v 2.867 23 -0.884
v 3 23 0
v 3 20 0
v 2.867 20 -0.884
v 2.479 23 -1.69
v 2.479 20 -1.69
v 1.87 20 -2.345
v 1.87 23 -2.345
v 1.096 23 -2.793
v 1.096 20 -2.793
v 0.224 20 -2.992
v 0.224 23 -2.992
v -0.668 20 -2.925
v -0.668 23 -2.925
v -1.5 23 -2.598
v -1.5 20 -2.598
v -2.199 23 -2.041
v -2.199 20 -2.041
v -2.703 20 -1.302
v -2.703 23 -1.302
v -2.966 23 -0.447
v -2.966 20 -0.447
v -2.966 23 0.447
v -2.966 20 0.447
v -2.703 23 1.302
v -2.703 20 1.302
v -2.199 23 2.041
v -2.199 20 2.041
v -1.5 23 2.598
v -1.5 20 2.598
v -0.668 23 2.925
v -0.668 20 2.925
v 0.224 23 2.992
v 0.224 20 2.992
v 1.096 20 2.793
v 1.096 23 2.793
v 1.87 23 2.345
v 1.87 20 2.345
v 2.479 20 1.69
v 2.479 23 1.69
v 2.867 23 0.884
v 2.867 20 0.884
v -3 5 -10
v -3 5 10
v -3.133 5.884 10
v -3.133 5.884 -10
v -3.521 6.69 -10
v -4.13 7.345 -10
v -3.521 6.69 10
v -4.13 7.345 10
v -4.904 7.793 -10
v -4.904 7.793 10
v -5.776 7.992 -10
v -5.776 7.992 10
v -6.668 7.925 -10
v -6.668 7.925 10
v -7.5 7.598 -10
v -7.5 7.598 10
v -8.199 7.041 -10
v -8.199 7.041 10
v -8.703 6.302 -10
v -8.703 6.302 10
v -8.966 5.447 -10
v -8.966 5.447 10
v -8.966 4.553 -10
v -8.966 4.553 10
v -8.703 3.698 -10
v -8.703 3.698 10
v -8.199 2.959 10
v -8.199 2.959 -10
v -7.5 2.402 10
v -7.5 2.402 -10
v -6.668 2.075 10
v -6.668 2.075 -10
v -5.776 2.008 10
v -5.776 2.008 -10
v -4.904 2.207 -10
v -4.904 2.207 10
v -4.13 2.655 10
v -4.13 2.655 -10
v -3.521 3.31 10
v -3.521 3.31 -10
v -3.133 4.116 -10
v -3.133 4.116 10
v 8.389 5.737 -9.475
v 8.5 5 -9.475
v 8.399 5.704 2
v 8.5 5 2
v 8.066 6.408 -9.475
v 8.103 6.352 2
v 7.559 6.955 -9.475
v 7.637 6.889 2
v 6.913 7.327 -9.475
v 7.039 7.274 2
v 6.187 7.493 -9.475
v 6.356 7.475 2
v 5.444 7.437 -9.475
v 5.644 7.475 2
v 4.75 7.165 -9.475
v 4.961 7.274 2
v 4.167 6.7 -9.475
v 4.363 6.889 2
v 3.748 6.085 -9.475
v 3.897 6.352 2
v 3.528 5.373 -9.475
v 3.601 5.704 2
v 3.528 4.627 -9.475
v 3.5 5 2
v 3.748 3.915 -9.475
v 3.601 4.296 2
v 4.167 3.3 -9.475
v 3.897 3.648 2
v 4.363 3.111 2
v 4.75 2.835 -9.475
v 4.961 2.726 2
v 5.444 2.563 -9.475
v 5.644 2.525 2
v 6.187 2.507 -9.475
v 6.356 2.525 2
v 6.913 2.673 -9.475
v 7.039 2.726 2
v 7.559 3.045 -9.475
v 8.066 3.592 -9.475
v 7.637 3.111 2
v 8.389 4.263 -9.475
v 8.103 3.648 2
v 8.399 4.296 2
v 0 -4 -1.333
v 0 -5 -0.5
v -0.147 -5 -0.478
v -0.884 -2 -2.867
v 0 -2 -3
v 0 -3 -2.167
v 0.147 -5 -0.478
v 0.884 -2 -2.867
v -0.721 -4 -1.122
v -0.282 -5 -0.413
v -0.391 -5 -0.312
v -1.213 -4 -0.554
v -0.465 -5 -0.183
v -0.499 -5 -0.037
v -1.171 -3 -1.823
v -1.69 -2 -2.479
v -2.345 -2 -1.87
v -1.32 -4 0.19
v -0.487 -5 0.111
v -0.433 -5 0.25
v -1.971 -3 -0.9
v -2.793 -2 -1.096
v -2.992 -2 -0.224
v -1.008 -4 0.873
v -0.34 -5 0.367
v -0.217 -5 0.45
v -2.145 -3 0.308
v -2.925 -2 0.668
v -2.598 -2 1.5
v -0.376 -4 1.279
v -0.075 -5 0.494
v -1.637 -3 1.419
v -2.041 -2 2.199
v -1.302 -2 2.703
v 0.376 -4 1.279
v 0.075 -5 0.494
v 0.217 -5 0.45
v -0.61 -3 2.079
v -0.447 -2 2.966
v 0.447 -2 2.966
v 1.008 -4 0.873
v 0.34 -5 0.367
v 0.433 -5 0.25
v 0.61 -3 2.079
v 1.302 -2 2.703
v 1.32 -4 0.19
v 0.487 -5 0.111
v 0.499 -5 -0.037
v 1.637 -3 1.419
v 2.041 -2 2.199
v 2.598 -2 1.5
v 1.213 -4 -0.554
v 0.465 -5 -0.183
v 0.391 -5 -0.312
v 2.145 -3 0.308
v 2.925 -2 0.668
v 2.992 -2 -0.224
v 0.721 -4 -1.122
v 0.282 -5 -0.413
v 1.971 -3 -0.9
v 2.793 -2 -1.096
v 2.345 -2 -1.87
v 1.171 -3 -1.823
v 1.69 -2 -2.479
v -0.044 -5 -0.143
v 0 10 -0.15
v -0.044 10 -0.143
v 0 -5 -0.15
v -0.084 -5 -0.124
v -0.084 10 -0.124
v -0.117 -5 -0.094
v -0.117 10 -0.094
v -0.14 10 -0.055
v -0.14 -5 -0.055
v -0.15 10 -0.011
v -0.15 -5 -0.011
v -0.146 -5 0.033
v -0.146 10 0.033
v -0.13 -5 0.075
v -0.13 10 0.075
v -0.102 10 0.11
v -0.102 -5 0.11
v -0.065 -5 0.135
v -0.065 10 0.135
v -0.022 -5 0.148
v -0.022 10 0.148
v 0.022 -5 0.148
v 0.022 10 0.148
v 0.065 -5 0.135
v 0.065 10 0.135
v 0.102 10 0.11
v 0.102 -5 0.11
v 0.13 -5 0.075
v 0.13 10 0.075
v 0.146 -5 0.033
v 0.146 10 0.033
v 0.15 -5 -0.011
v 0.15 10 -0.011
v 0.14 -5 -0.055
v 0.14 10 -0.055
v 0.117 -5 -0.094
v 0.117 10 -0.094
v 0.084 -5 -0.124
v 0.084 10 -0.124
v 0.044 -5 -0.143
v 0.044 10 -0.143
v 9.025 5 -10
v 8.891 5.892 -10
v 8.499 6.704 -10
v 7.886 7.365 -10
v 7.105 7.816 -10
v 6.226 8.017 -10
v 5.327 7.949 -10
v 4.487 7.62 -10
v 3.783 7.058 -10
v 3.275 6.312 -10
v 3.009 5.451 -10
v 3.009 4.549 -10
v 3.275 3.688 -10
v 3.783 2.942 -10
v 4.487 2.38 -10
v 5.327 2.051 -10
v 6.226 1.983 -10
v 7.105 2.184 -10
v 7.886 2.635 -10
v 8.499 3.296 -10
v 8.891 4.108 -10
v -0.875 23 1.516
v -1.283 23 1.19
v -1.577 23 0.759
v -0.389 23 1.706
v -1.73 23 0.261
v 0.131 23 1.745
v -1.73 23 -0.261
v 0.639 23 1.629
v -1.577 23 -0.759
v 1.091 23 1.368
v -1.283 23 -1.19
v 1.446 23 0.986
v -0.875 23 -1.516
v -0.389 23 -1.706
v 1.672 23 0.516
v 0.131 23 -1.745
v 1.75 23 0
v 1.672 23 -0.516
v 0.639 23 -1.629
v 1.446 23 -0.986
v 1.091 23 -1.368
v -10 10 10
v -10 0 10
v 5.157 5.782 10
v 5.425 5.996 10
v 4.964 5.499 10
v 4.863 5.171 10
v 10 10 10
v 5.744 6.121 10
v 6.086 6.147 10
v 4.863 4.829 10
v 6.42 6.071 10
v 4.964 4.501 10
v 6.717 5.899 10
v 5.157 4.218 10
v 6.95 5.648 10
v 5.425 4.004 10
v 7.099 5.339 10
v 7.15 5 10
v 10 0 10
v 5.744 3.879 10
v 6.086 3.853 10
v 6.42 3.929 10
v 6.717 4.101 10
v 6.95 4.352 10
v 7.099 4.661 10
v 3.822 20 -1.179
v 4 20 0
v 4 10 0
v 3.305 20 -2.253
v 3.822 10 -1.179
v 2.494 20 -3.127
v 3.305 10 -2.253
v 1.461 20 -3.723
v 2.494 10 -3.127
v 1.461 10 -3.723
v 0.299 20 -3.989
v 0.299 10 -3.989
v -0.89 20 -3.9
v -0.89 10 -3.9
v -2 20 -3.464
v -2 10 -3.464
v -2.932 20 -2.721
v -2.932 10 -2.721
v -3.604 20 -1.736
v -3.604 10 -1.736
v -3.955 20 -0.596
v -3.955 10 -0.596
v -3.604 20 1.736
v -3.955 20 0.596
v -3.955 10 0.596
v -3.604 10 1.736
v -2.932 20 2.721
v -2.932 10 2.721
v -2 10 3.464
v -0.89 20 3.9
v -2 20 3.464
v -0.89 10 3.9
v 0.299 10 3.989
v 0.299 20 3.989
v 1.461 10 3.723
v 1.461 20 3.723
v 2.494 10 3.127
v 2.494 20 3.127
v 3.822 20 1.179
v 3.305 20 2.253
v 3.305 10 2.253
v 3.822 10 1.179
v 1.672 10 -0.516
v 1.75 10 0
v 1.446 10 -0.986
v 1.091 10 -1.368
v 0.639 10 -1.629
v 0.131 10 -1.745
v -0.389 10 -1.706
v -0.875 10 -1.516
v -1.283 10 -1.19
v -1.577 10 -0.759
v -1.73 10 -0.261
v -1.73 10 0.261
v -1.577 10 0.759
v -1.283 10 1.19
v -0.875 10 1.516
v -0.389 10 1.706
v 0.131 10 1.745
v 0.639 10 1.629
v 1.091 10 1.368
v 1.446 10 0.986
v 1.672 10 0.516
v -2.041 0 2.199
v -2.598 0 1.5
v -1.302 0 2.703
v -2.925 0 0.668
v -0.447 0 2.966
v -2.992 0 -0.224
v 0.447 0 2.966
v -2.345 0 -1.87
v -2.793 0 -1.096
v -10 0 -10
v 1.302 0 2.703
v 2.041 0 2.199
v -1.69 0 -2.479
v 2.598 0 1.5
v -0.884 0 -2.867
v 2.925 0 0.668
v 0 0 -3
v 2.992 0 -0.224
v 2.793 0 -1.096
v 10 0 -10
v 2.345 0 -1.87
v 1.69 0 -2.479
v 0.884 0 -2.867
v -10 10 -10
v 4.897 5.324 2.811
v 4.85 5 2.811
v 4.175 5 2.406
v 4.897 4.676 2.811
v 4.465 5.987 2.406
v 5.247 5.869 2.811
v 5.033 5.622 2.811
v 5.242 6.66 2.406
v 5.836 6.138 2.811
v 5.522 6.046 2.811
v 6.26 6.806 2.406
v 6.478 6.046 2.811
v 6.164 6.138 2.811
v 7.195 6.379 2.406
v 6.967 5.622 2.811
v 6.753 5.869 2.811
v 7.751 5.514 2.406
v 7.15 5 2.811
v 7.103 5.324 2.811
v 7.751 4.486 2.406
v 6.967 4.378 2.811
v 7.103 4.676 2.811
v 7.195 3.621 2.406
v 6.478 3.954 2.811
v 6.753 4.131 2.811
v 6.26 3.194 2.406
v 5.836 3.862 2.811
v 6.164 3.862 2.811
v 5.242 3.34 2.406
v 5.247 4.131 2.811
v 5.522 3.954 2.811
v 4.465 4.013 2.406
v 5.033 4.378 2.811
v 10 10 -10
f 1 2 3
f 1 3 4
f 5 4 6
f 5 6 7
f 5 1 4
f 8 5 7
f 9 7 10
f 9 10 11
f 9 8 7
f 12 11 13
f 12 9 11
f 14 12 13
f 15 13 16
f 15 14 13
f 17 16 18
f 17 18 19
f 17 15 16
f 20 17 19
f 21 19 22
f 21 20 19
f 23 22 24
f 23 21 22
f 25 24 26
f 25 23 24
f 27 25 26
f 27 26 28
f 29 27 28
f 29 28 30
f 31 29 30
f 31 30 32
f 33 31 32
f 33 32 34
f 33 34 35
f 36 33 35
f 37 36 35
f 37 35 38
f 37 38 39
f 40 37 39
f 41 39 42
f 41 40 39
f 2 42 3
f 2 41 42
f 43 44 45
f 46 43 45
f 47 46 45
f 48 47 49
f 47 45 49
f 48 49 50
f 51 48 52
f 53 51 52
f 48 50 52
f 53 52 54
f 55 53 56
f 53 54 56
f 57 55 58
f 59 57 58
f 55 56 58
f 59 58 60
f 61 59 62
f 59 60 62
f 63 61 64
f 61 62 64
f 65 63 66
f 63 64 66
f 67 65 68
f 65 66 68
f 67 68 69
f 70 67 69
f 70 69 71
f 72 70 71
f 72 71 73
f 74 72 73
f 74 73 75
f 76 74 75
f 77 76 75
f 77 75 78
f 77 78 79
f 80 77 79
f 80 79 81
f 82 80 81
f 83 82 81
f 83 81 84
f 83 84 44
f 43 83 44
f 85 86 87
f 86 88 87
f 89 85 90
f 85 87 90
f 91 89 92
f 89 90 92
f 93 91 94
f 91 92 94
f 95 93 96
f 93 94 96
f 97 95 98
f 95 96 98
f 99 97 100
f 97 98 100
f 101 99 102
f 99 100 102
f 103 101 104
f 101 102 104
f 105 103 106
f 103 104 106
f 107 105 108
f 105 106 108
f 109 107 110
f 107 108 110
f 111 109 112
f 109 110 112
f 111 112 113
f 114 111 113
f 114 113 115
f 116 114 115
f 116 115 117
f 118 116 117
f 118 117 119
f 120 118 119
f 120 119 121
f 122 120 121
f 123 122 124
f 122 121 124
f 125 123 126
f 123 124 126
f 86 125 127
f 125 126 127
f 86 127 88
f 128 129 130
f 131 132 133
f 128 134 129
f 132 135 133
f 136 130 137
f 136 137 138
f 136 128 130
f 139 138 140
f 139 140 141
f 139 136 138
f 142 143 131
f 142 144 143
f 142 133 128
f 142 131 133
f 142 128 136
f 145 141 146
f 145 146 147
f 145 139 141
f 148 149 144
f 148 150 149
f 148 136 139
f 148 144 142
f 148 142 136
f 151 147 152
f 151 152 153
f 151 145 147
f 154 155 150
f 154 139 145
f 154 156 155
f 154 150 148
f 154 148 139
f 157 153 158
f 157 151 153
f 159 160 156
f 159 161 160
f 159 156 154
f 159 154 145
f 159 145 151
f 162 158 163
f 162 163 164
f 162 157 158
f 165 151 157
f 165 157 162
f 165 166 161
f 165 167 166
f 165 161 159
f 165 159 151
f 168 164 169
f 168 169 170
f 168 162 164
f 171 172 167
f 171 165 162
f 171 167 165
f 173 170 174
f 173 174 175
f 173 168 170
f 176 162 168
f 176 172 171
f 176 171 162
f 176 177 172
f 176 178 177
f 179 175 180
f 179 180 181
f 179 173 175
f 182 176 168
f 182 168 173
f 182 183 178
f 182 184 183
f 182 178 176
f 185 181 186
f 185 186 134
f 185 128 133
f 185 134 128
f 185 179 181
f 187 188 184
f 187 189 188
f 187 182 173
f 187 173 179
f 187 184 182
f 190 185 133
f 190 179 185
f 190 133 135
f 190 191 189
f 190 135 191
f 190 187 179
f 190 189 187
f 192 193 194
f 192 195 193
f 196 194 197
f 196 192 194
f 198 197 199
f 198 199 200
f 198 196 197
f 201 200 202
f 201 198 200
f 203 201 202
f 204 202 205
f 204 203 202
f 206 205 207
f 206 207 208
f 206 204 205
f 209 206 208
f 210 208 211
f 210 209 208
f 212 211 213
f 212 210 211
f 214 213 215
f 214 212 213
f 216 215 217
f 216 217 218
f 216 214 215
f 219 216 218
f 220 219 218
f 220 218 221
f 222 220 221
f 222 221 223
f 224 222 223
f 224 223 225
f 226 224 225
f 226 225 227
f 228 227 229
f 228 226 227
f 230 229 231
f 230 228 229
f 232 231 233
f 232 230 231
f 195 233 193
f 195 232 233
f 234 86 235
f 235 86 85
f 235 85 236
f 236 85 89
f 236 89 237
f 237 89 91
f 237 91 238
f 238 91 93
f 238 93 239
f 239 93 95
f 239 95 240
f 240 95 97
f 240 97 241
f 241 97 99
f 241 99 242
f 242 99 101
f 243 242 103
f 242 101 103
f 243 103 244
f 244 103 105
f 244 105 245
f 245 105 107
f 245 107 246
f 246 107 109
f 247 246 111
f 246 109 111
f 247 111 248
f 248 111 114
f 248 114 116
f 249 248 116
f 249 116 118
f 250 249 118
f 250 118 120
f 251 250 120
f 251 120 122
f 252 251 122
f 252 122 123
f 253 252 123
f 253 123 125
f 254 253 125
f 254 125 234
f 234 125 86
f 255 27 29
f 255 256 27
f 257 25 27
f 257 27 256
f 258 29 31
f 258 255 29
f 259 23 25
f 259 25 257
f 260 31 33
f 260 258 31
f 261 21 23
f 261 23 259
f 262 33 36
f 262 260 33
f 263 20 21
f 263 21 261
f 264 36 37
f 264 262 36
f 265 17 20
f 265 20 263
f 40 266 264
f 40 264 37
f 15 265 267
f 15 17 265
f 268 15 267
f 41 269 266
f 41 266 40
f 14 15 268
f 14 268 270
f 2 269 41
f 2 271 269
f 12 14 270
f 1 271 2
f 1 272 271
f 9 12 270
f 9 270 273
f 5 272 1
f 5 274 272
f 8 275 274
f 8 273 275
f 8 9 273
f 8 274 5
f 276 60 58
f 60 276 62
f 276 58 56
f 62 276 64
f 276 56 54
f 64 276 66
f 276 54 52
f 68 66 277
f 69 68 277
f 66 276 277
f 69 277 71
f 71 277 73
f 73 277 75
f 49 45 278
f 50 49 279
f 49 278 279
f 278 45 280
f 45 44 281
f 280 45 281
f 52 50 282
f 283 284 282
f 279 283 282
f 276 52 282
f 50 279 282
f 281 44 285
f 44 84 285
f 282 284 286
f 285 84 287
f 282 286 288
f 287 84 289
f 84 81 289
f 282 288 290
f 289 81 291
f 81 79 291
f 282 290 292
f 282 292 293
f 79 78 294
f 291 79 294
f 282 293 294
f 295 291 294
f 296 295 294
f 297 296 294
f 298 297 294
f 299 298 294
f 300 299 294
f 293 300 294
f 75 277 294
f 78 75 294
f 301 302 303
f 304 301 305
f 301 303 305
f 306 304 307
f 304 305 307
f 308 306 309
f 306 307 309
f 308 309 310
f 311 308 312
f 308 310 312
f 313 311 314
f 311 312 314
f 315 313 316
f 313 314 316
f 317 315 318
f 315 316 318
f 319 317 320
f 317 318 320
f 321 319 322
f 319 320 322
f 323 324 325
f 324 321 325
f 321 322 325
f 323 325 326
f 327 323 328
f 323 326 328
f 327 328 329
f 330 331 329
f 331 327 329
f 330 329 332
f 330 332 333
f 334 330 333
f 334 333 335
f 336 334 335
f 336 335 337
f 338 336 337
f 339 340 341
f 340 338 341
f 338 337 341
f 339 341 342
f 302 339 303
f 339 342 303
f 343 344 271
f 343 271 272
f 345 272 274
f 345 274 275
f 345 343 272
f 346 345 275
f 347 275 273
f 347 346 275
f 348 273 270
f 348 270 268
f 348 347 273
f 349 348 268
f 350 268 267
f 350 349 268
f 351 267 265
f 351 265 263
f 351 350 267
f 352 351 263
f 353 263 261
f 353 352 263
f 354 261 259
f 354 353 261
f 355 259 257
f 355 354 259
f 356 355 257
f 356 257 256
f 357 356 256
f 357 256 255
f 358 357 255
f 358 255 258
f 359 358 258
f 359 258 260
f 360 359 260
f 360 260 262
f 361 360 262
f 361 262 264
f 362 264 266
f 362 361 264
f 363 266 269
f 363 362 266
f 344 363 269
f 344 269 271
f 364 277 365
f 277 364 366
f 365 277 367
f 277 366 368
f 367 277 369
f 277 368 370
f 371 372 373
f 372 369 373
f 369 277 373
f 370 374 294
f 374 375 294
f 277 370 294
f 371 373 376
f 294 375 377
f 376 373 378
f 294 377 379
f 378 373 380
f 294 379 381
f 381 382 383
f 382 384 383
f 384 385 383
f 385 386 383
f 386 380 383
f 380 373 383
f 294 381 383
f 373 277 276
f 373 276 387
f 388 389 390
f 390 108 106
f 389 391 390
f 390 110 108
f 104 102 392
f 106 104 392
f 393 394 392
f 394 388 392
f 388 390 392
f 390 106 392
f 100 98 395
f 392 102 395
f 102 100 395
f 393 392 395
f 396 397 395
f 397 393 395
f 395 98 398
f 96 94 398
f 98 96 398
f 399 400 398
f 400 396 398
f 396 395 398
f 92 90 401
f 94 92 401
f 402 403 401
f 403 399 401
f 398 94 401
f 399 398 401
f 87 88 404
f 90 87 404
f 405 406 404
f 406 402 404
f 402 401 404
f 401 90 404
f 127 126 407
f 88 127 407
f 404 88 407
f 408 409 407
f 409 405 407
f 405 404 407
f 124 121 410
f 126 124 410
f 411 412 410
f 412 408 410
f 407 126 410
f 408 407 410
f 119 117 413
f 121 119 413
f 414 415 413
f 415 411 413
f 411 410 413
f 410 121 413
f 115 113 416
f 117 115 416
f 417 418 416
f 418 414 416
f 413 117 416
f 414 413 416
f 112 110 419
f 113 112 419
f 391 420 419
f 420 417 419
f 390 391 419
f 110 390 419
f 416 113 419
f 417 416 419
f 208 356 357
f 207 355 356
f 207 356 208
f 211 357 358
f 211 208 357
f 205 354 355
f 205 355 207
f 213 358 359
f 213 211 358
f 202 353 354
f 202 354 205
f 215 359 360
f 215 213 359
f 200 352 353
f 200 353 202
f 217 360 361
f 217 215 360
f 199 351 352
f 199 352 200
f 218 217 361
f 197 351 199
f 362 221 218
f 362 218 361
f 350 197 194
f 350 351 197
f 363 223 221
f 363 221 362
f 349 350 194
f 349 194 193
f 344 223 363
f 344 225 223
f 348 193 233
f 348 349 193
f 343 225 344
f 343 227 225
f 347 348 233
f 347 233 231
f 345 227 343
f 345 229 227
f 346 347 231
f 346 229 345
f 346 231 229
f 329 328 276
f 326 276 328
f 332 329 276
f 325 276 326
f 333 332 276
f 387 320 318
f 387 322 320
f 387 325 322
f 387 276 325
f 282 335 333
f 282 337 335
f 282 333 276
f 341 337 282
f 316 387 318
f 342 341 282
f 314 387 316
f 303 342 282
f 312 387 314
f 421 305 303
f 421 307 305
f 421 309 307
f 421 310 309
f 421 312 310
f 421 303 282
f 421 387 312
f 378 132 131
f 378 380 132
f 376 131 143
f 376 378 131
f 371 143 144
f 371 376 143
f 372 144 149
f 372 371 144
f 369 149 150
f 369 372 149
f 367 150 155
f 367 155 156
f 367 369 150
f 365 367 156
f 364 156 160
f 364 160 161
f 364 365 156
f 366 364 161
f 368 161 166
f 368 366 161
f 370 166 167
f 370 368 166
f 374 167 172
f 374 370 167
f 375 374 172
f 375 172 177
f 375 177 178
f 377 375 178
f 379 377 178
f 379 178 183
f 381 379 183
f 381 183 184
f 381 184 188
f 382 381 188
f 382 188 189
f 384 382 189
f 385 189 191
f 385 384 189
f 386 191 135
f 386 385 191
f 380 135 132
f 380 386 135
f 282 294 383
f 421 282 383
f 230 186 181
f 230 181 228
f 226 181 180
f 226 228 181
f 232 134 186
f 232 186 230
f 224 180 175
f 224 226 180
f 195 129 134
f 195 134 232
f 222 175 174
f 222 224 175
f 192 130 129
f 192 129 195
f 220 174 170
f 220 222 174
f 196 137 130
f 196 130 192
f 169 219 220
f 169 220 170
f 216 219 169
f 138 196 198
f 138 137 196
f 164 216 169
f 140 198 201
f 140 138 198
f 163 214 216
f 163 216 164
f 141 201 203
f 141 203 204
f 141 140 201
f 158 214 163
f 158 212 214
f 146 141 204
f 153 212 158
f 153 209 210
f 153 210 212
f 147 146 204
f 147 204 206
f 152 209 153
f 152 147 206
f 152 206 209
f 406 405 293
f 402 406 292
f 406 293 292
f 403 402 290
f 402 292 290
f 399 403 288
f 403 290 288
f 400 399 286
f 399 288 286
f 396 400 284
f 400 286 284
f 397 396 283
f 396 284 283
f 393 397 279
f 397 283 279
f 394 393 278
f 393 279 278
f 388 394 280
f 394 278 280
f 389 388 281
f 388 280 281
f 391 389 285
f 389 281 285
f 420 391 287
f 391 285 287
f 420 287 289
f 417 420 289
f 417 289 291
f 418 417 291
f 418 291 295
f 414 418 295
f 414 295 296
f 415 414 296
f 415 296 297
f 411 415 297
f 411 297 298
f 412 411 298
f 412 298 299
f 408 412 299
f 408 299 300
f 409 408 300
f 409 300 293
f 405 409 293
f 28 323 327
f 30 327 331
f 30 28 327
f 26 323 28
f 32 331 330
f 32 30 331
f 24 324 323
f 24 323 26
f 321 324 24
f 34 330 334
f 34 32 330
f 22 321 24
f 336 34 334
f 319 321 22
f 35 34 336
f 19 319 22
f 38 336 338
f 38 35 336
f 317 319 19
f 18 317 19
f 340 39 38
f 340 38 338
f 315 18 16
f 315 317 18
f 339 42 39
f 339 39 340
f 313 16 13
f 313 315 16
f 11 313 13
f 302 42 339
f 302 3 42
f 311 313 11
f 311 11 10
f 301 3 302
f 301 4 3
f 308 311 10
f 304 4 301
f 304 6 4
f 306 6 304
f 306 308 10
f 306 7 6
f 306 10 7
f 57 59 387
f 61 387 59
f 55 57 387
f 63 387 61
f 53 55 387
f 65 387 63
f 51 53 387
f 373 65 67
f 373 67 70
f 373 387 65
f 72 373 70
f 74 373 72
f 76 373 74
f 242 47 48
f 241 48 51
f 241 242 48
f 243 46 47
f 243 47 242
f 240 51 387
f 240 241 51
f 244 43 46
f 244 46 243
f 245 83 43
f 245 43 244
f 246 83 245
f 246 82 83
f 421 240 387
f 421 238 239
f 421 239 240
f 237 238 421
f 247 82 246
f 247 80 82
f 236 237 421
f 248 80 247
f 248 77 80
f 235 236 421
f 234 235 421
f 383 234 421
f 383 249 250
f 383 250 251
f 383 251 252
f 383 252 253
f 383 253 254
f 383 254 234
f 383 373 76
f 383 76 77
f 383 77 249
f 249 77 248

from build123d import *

# Parameters (mm, degrees)
SCHIZZO2_W                          = 20
SCHIZZO2_H                          = 20
SCHIZZO2_R                          = 0.15
ESTRUSIONE_ESTRUSIONE1_DEPTH        = 10
SCHIZZO3_R                          = 4
SCHIZZO3_R_2                        = 1.75
ESTRUSIONE_SOTTILE1_DEPTH           = 13
TAGLIO_ESTRUSIONE1_REACH            = 34.078
SCHIZZO4_R                          = 3
SCHIZZO4_R_2                        = 1.15
FORO_FILETTATO_M6X1_0_1_D           = 5
FORO_FILETTATO_M6X1_0_1_DEPTH       = 12
FORO_FILETTATO_M6X1_0_1_CSINK_D     = 6.05
FORO_FILETTATO_M6X1_0_1_CSINK_ANGLE = 90
FORO_FILETTATO_M6X1_0_1_TIP         = 1.502151548
SCHIZZO8_R                          = 13
SCHIZZO8_R_2                        = 3
TAGLIO_ESTRUSIONE_SOTTILE1_DEPTH    = 3


with BuildPart() as part:
    # Schizzo1 → Rivoluzione1 (revolve)
    with BuildSketch(Plane.XY, mode=Mode.PRIVATE) as rivoluzione1_sk:
        Polygon((-0.15, 0), (-0.15, -5), (-0.5, -5), (-3, -2), (-3, 0), align=None)
    revolve(rivoluzione1_sk.sketch.rotate(Axis((0, -26.528171736, 0), (0, 1, 0)), 270), axis=Axis((0, -26.528171736, 0), (0, 1, 0)))

    # Schizzo2 → Estrusione-Estrusione1 (add)
    with BuildSketch(Plane(origin=(0, 0, 0), x_dir=(1, 0, 0), z_dir=(0, 1, 0))):
        Rectangle(SCHIZZO2_W, SCHIZZO2_H)
        with Locations(Location((0, 0, 0), (0, 0, 90))):
            Circle(SCHIZZO2_R, mode=Mode.SUBTRACT)
    extrude(amount=ESTRUSIONE_ESTRUSIONE1_DEPTH)

    # Schizzo3 → Estrusione-Sottile1 (add)
    with BuildSketch(Plane(origin=(0, 10, 0), x_dir=(1, 0, 0), z_dir=(0, 1, 0))):
        Circle(SCHIZZO3_R)
        Circle(SCHIZZO3_R_2, mode=Mode.SUBTRACT)
    extrude(amount=ESTRUSIONE_SOTTILE1_DEPTH)

    # Schizzo4 → Taglio-Estrusione1 (cut, up to next)
    with BuildSketch(Plane.XY.offset(10), mode=Mode.PRIVATE) as taglio_estrusione1_sk1:
        with Locations((-6, 5)):
            Circle(SCHIZZO4_R)
    taglio_estrusione1_tool1 = extrude(taglio_estrusione1_sk1.sketch, amount=-TAGLIO_ESTRUSIONE1_REACH, mode=Mode.PRIVATE) & part.part
    # Schizzo4 → Taglio-Estrusione1 (cut, up to next)
    with BuildSketch(Plane.XY.offset(10), mode=Mode.PRIVATE) as taglio_estrusione1_sk2:
        with Locations((6, 5)):
            Circle(SCHIZZO4_R_2)
    taglio_estrusione1_tool2 = extrude(taglio_estrusione1_sk2.sketch, amount=-TAGLIO_ESTRUSIONE1_REACH, mode=Mode.PRIVATE) & part.part
    add(taglio_estrusione1_tool1.solids().sort_by_distance((-6, 5, 10))[0], mode=Mode.SUBTRACT)
    add(taglio_estrusione1_tool2.solids().sort_by_distance((6, 5, 10))[0], mode=Mode.SUBTRACT)

    # Foro filettato M6x1.0-1
    with Locations(Plane(origin=(0, 0, -10), x_dir=(-1, 0, 0), z_dir=(0, 0, -1))):
        with Locations((-6, 5)):
            CounterSinkHole(FORO_FILETTATO_M6X1_0_1_D / 2, FORO_FILETTATO_M6X1_0_1_CSINK_D / 2, depth=FORO_FILETTATO_M6X1_0_1_DEPTH, counter_sink_angle=FORO_FILETTATO_M6X1_0_1_CSINK_ANGLE)
            with Locations((0, 0, -(FORO_FILETTATO_M6X1_0_1_DEPTH + FORO_FILETTATO_M6X1_0_1_TIP / 2))):  # 118° drill point
                Cone(0, FORO_FILETTATO_M6X1_0_1_D / 2, FORO_FILETTATO_M6X1_0_1_TIP, mode=Mode.SUBTRACT)

    # Schizzo8 → Taglio-Estrusione-Sottile1 (cut)
    with BuildSketch(Plane(origin=(0, 23, 0), x_dir=(1, 0, 0), z_dir=(0, 1, 0))):
        Circle(SCHIZZO8_R)
        Circle(SCHIZZO8_R_2, mode=Mode.SUBTRACT)
    extrude(amount=-TAGLIO_ESTRUSIONE_SOTTILE1_DEPTH, mode=Mode.SUBTRACT)


solid = part.part
